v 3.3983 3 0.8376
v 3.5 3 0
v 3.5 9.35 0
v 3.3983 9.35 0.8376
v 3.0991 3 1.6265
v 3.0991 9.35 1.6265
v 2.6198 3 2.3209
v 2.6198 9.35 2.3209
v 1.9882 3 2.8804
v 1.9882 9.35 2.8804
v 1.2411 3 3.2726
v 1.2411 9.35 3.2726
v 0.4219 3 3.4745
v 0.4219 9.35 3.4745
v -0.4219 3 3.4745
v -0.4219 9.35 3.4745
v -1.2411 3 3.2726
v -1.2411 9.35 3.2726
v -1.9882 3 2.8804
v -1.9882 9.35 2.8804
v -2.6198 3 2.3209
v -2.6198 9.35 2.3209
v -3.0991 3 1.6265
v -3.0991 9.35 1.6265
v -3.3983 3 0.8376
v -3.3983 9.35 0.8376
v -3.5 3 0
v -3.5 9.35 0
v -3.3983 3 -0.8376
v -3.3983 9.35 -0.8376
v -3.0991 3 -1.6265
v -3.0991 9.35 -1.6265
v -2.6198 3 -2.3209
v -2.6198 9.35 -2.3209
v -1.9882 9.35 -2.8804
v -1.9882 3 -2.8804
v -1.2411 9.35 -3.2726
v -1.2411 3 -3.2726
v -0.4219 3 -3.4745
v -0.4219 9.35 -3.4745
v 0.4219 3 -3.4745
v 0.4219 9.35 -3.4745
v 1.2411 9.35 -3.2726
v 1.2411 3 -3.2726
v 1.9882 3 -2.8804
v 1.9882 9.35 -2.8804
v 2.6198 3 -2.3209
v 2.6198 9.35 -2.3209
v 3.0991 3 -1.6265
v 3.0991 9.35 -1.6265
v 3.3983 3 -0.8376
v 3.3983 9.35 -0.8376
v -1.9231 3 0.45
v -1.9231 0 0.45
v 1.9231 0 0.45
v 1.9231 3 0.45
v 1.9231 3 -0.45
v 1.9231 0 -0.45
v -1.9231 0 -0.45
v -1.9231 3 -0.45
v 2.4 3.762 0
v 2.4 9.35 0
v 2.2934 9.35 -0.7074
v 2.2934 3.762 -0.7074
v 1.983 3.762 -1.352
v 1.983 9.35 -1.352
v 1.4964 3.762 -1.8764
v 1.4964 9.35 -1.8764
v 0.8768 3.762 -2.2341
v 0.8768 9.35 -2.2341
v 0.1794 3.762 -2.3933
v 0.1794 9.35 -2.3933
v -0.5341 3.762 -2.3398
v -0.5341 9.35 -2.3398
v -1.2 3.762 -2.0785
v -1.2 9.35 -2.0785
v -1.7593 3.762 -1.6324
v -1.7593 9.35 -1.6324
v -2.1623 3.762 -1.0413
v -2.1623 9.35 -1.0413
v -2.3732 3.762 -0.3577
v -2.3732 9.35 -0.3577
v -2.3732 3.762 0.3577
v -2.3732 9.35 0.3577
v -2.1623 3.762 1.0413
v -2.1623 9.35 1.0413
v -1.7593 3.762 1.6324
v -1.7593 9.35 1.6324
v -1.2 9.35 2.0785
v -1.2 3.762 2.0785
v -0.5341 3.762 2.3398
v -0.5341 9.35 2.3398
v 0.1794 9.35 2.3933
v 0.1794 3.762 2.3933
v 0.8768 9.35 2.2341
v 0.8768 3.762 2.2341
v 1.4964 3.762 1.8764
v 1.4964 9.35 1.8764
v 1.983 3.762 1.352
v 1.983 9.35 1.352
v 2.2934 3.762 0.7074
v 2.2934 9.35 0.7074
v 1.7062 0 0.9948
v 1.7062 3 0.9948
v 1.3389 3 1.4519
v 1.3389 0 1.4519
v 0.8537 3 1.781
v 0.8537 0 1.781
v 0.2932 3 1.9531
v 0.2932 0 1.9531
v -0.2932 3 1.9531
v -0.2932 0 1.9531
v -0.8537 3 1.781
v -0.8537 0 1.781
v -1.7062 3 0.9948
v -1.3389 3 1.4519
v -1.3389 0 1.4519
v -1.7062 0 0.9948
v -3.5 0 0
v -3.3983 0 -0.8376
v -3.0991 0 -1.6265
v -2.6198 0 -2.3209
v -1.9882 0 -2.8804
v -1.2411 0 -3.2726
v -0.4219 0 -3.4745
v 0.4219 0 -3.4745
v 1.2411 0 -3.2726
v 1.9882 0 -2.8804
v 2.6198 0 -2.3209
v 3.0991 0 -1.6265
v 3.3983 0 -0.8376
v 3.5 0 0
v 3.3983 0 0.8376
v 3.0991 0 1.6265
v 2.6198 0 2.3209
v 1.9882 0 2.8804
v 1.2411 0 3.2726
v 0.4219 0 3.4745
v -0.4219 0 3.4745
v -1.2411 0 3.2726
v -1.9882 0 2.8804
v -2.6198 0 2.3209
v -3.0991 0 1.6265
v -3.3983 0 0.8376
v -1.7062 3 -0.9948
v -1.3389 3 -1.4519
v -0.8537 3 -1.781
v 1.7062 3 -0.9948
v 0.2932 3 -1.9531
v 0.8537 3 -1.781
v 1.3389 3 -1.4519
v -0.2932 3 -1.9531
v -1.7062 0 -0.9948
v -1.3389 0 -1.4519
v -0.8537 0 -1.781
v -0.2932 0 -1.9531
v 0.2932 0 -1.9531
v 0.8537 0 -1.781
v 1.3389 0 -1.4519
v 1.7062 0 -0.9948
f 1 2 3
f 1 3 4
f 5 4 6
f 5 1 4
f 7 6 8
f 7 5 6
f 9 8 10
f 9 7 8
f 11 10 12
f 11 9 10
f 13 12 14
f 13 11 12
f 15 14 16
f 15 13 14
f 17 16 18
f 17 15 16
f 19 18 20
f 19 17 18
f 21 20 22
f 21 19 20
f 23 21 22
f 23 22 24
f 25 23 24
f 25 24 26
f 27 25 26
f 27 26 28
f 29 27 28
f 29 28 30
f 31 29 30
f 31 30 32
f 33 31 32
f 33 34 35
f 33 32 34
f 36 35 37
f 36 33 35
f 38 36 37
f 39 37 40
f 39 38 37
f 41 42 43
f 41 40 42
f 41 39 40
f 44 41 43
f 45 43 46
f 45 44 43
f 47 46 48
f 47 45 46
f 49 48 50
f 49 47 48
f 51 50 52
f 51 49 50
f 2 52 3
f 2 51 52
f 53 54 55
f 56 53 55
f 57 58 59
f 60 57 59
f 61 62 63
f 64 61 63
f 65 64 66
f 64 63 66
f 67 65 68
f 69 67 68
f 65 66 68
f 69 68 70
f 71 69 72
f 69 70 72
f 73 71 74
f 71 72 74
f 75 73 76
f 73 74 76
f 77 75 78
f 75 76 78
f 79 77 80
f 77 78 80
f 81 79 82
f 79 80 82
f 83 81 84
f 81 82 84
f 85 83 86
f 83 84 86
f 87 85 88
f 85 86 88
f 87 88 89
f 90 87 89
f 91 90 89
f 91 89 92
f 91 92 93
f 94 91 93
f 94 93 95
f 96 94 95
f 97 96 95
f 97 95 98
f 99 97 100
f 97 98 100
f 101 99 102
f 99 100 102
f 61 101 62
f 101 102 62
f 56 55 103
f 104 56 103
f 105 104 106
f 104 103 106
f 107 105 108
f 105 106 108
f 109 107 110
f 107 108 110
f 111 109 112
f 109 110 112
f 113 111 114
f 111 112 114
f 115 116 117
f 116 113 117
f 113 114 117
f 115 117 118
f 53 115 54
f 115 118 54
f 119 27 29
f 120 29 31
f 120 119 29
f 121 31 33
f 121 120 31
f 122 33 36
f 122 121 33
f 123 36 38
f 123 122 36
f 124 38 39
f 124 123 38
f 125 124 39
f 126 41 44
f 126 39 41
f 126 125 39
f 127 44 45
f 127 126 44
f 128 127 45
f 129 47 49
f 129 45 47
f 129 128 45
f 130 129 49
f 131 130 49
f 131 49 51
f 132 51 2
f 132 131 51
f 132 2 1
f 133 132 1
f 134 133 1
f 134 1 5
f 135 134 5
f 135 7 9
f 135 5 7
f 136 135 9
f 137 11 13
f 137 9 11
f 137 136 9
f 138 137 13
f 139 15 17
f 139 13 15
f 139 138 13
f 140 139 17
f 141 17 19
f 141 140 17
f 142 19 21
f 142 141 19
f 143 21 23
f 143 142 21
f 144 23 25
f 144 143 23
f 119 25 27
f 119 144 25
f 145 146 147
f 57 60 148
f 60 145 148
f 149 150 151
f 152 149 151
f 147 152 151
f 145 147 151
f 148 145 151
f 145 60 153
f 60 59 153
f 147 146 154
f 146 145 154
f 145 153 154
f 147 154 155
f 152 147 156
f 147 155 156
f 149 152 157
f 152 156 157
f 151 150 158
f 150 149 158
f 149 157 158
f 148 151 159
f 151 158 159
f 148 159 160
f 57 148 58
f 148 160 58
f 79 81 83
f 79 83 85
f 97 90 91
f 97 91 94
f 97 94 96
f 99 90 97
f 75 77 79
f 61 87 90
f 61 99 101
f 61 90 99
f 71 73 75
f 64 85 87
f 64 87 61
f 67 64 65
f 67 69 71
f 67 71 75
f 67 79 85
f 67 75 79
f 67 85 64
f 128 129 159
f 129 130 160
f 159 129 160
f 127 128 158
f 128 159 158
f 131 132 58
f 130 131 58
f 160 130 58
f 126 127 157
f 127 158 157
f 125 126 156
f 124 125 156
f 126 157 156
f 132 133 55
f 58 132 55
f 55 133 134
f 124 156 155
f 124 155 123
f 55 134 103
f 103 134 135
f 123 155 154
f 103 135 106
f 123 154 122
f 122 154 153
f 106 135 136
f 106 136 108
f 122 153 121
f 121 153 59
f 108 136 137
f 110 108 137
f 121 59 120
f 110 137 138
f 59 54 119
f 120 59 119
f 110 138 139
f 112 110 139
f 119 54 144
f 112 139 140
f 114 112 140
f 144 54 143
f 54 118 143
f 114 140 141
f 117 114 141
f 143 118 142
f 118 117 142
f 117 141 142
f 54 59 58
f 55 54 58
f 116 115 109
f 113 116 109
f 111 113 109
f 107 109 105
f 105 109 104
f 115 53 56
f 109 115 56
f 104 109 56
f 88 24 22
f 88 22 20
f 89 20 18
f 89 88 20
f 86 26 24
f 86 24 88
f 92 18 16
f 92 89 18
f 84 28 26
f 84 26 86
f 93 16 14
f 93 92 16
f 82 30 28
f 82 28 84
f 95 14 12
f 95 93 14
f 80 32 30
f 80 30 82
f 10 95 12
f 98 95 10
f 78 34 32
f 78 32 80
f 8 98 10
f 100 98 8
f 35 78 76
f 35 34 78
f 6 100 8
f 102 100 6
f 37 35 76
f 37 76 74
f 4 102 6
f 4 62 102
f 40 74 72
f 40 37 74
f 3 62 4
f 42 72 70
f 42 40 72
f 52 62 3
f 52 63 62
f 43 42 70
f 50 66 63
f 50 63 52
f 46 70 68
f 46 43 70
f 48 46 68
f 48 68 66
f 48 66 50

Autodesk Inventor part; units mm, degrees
ref_plane "YZ Plane" through (0, 0, 0) normal (1, 0, 0) x (0, 1, 0)
ref_plane "XZ Plane" through (0, 0, 0) normal (0, 1, 0) x (-1, 0, 0)
ref_plane "XY Plane" through (0, 0, 0) normal (0, 0, 1) x (1, 0, 0)
sketch "Sketch1" plane through (0, 0, 0) normal (0, 1, 0) x (-1, 0, 0)
  circle A0 centre (0, 0) radius 1.975
  circle A1 centre (0, 0) radius 3.5
  line L0 (-2.286, -0.45) -> (2.286, -0.45)
  line L1 (2.286, -0.45) -> (2.286, 0.45)
  line L2 (2.286, 0.45) -> (-2.286, 0.45)
  line L3 (-2.286, 0.45) -> (-2.286, -0.45)
  line L4 (-2.286, -0.45) -> (2.286, 0.45) construction
  line L5 (2.286, -0.45) -> (-2.286, 0.45) construction
  point P0 (-1.9231, 0.45)
  point P1 (1.9231, 0.45)
  point P2 (1.9231, -0.45)
  point P3 (-1.9231, -0.45)
  dimension "d0" = 3.95
  dimension "d1" = 7
  dimension "d2" = 0.9
  dimension "d10" = 4.572
extrude "Extrusion1" add sketch "Sketch1" along normal blind 3 contours A0 L0 L2 | A0 L2 L1 L0 | A0 L0 L3 L2 | A1
sketch "Sketch2" plane through (0, 3, 0) normal (0, 1, 0) x (1, 0, 0)
  circle A0 centre (0, 0) radius 3.5
extrude "Extrusion2" add sketch "Sketch2" along normal blind 6.35
sketch "Sketch3" plane through (0, 9.35, 0) normal (0, 1, 0) x (1, 0, 0)
  circle A0 centre (0, 0) radius 2.4
  dimension "d7" = 4.8
extrude "Extrusion3" cut sketch "Sketch3" against normal blind 5.588
properties part number "TurnBot"
